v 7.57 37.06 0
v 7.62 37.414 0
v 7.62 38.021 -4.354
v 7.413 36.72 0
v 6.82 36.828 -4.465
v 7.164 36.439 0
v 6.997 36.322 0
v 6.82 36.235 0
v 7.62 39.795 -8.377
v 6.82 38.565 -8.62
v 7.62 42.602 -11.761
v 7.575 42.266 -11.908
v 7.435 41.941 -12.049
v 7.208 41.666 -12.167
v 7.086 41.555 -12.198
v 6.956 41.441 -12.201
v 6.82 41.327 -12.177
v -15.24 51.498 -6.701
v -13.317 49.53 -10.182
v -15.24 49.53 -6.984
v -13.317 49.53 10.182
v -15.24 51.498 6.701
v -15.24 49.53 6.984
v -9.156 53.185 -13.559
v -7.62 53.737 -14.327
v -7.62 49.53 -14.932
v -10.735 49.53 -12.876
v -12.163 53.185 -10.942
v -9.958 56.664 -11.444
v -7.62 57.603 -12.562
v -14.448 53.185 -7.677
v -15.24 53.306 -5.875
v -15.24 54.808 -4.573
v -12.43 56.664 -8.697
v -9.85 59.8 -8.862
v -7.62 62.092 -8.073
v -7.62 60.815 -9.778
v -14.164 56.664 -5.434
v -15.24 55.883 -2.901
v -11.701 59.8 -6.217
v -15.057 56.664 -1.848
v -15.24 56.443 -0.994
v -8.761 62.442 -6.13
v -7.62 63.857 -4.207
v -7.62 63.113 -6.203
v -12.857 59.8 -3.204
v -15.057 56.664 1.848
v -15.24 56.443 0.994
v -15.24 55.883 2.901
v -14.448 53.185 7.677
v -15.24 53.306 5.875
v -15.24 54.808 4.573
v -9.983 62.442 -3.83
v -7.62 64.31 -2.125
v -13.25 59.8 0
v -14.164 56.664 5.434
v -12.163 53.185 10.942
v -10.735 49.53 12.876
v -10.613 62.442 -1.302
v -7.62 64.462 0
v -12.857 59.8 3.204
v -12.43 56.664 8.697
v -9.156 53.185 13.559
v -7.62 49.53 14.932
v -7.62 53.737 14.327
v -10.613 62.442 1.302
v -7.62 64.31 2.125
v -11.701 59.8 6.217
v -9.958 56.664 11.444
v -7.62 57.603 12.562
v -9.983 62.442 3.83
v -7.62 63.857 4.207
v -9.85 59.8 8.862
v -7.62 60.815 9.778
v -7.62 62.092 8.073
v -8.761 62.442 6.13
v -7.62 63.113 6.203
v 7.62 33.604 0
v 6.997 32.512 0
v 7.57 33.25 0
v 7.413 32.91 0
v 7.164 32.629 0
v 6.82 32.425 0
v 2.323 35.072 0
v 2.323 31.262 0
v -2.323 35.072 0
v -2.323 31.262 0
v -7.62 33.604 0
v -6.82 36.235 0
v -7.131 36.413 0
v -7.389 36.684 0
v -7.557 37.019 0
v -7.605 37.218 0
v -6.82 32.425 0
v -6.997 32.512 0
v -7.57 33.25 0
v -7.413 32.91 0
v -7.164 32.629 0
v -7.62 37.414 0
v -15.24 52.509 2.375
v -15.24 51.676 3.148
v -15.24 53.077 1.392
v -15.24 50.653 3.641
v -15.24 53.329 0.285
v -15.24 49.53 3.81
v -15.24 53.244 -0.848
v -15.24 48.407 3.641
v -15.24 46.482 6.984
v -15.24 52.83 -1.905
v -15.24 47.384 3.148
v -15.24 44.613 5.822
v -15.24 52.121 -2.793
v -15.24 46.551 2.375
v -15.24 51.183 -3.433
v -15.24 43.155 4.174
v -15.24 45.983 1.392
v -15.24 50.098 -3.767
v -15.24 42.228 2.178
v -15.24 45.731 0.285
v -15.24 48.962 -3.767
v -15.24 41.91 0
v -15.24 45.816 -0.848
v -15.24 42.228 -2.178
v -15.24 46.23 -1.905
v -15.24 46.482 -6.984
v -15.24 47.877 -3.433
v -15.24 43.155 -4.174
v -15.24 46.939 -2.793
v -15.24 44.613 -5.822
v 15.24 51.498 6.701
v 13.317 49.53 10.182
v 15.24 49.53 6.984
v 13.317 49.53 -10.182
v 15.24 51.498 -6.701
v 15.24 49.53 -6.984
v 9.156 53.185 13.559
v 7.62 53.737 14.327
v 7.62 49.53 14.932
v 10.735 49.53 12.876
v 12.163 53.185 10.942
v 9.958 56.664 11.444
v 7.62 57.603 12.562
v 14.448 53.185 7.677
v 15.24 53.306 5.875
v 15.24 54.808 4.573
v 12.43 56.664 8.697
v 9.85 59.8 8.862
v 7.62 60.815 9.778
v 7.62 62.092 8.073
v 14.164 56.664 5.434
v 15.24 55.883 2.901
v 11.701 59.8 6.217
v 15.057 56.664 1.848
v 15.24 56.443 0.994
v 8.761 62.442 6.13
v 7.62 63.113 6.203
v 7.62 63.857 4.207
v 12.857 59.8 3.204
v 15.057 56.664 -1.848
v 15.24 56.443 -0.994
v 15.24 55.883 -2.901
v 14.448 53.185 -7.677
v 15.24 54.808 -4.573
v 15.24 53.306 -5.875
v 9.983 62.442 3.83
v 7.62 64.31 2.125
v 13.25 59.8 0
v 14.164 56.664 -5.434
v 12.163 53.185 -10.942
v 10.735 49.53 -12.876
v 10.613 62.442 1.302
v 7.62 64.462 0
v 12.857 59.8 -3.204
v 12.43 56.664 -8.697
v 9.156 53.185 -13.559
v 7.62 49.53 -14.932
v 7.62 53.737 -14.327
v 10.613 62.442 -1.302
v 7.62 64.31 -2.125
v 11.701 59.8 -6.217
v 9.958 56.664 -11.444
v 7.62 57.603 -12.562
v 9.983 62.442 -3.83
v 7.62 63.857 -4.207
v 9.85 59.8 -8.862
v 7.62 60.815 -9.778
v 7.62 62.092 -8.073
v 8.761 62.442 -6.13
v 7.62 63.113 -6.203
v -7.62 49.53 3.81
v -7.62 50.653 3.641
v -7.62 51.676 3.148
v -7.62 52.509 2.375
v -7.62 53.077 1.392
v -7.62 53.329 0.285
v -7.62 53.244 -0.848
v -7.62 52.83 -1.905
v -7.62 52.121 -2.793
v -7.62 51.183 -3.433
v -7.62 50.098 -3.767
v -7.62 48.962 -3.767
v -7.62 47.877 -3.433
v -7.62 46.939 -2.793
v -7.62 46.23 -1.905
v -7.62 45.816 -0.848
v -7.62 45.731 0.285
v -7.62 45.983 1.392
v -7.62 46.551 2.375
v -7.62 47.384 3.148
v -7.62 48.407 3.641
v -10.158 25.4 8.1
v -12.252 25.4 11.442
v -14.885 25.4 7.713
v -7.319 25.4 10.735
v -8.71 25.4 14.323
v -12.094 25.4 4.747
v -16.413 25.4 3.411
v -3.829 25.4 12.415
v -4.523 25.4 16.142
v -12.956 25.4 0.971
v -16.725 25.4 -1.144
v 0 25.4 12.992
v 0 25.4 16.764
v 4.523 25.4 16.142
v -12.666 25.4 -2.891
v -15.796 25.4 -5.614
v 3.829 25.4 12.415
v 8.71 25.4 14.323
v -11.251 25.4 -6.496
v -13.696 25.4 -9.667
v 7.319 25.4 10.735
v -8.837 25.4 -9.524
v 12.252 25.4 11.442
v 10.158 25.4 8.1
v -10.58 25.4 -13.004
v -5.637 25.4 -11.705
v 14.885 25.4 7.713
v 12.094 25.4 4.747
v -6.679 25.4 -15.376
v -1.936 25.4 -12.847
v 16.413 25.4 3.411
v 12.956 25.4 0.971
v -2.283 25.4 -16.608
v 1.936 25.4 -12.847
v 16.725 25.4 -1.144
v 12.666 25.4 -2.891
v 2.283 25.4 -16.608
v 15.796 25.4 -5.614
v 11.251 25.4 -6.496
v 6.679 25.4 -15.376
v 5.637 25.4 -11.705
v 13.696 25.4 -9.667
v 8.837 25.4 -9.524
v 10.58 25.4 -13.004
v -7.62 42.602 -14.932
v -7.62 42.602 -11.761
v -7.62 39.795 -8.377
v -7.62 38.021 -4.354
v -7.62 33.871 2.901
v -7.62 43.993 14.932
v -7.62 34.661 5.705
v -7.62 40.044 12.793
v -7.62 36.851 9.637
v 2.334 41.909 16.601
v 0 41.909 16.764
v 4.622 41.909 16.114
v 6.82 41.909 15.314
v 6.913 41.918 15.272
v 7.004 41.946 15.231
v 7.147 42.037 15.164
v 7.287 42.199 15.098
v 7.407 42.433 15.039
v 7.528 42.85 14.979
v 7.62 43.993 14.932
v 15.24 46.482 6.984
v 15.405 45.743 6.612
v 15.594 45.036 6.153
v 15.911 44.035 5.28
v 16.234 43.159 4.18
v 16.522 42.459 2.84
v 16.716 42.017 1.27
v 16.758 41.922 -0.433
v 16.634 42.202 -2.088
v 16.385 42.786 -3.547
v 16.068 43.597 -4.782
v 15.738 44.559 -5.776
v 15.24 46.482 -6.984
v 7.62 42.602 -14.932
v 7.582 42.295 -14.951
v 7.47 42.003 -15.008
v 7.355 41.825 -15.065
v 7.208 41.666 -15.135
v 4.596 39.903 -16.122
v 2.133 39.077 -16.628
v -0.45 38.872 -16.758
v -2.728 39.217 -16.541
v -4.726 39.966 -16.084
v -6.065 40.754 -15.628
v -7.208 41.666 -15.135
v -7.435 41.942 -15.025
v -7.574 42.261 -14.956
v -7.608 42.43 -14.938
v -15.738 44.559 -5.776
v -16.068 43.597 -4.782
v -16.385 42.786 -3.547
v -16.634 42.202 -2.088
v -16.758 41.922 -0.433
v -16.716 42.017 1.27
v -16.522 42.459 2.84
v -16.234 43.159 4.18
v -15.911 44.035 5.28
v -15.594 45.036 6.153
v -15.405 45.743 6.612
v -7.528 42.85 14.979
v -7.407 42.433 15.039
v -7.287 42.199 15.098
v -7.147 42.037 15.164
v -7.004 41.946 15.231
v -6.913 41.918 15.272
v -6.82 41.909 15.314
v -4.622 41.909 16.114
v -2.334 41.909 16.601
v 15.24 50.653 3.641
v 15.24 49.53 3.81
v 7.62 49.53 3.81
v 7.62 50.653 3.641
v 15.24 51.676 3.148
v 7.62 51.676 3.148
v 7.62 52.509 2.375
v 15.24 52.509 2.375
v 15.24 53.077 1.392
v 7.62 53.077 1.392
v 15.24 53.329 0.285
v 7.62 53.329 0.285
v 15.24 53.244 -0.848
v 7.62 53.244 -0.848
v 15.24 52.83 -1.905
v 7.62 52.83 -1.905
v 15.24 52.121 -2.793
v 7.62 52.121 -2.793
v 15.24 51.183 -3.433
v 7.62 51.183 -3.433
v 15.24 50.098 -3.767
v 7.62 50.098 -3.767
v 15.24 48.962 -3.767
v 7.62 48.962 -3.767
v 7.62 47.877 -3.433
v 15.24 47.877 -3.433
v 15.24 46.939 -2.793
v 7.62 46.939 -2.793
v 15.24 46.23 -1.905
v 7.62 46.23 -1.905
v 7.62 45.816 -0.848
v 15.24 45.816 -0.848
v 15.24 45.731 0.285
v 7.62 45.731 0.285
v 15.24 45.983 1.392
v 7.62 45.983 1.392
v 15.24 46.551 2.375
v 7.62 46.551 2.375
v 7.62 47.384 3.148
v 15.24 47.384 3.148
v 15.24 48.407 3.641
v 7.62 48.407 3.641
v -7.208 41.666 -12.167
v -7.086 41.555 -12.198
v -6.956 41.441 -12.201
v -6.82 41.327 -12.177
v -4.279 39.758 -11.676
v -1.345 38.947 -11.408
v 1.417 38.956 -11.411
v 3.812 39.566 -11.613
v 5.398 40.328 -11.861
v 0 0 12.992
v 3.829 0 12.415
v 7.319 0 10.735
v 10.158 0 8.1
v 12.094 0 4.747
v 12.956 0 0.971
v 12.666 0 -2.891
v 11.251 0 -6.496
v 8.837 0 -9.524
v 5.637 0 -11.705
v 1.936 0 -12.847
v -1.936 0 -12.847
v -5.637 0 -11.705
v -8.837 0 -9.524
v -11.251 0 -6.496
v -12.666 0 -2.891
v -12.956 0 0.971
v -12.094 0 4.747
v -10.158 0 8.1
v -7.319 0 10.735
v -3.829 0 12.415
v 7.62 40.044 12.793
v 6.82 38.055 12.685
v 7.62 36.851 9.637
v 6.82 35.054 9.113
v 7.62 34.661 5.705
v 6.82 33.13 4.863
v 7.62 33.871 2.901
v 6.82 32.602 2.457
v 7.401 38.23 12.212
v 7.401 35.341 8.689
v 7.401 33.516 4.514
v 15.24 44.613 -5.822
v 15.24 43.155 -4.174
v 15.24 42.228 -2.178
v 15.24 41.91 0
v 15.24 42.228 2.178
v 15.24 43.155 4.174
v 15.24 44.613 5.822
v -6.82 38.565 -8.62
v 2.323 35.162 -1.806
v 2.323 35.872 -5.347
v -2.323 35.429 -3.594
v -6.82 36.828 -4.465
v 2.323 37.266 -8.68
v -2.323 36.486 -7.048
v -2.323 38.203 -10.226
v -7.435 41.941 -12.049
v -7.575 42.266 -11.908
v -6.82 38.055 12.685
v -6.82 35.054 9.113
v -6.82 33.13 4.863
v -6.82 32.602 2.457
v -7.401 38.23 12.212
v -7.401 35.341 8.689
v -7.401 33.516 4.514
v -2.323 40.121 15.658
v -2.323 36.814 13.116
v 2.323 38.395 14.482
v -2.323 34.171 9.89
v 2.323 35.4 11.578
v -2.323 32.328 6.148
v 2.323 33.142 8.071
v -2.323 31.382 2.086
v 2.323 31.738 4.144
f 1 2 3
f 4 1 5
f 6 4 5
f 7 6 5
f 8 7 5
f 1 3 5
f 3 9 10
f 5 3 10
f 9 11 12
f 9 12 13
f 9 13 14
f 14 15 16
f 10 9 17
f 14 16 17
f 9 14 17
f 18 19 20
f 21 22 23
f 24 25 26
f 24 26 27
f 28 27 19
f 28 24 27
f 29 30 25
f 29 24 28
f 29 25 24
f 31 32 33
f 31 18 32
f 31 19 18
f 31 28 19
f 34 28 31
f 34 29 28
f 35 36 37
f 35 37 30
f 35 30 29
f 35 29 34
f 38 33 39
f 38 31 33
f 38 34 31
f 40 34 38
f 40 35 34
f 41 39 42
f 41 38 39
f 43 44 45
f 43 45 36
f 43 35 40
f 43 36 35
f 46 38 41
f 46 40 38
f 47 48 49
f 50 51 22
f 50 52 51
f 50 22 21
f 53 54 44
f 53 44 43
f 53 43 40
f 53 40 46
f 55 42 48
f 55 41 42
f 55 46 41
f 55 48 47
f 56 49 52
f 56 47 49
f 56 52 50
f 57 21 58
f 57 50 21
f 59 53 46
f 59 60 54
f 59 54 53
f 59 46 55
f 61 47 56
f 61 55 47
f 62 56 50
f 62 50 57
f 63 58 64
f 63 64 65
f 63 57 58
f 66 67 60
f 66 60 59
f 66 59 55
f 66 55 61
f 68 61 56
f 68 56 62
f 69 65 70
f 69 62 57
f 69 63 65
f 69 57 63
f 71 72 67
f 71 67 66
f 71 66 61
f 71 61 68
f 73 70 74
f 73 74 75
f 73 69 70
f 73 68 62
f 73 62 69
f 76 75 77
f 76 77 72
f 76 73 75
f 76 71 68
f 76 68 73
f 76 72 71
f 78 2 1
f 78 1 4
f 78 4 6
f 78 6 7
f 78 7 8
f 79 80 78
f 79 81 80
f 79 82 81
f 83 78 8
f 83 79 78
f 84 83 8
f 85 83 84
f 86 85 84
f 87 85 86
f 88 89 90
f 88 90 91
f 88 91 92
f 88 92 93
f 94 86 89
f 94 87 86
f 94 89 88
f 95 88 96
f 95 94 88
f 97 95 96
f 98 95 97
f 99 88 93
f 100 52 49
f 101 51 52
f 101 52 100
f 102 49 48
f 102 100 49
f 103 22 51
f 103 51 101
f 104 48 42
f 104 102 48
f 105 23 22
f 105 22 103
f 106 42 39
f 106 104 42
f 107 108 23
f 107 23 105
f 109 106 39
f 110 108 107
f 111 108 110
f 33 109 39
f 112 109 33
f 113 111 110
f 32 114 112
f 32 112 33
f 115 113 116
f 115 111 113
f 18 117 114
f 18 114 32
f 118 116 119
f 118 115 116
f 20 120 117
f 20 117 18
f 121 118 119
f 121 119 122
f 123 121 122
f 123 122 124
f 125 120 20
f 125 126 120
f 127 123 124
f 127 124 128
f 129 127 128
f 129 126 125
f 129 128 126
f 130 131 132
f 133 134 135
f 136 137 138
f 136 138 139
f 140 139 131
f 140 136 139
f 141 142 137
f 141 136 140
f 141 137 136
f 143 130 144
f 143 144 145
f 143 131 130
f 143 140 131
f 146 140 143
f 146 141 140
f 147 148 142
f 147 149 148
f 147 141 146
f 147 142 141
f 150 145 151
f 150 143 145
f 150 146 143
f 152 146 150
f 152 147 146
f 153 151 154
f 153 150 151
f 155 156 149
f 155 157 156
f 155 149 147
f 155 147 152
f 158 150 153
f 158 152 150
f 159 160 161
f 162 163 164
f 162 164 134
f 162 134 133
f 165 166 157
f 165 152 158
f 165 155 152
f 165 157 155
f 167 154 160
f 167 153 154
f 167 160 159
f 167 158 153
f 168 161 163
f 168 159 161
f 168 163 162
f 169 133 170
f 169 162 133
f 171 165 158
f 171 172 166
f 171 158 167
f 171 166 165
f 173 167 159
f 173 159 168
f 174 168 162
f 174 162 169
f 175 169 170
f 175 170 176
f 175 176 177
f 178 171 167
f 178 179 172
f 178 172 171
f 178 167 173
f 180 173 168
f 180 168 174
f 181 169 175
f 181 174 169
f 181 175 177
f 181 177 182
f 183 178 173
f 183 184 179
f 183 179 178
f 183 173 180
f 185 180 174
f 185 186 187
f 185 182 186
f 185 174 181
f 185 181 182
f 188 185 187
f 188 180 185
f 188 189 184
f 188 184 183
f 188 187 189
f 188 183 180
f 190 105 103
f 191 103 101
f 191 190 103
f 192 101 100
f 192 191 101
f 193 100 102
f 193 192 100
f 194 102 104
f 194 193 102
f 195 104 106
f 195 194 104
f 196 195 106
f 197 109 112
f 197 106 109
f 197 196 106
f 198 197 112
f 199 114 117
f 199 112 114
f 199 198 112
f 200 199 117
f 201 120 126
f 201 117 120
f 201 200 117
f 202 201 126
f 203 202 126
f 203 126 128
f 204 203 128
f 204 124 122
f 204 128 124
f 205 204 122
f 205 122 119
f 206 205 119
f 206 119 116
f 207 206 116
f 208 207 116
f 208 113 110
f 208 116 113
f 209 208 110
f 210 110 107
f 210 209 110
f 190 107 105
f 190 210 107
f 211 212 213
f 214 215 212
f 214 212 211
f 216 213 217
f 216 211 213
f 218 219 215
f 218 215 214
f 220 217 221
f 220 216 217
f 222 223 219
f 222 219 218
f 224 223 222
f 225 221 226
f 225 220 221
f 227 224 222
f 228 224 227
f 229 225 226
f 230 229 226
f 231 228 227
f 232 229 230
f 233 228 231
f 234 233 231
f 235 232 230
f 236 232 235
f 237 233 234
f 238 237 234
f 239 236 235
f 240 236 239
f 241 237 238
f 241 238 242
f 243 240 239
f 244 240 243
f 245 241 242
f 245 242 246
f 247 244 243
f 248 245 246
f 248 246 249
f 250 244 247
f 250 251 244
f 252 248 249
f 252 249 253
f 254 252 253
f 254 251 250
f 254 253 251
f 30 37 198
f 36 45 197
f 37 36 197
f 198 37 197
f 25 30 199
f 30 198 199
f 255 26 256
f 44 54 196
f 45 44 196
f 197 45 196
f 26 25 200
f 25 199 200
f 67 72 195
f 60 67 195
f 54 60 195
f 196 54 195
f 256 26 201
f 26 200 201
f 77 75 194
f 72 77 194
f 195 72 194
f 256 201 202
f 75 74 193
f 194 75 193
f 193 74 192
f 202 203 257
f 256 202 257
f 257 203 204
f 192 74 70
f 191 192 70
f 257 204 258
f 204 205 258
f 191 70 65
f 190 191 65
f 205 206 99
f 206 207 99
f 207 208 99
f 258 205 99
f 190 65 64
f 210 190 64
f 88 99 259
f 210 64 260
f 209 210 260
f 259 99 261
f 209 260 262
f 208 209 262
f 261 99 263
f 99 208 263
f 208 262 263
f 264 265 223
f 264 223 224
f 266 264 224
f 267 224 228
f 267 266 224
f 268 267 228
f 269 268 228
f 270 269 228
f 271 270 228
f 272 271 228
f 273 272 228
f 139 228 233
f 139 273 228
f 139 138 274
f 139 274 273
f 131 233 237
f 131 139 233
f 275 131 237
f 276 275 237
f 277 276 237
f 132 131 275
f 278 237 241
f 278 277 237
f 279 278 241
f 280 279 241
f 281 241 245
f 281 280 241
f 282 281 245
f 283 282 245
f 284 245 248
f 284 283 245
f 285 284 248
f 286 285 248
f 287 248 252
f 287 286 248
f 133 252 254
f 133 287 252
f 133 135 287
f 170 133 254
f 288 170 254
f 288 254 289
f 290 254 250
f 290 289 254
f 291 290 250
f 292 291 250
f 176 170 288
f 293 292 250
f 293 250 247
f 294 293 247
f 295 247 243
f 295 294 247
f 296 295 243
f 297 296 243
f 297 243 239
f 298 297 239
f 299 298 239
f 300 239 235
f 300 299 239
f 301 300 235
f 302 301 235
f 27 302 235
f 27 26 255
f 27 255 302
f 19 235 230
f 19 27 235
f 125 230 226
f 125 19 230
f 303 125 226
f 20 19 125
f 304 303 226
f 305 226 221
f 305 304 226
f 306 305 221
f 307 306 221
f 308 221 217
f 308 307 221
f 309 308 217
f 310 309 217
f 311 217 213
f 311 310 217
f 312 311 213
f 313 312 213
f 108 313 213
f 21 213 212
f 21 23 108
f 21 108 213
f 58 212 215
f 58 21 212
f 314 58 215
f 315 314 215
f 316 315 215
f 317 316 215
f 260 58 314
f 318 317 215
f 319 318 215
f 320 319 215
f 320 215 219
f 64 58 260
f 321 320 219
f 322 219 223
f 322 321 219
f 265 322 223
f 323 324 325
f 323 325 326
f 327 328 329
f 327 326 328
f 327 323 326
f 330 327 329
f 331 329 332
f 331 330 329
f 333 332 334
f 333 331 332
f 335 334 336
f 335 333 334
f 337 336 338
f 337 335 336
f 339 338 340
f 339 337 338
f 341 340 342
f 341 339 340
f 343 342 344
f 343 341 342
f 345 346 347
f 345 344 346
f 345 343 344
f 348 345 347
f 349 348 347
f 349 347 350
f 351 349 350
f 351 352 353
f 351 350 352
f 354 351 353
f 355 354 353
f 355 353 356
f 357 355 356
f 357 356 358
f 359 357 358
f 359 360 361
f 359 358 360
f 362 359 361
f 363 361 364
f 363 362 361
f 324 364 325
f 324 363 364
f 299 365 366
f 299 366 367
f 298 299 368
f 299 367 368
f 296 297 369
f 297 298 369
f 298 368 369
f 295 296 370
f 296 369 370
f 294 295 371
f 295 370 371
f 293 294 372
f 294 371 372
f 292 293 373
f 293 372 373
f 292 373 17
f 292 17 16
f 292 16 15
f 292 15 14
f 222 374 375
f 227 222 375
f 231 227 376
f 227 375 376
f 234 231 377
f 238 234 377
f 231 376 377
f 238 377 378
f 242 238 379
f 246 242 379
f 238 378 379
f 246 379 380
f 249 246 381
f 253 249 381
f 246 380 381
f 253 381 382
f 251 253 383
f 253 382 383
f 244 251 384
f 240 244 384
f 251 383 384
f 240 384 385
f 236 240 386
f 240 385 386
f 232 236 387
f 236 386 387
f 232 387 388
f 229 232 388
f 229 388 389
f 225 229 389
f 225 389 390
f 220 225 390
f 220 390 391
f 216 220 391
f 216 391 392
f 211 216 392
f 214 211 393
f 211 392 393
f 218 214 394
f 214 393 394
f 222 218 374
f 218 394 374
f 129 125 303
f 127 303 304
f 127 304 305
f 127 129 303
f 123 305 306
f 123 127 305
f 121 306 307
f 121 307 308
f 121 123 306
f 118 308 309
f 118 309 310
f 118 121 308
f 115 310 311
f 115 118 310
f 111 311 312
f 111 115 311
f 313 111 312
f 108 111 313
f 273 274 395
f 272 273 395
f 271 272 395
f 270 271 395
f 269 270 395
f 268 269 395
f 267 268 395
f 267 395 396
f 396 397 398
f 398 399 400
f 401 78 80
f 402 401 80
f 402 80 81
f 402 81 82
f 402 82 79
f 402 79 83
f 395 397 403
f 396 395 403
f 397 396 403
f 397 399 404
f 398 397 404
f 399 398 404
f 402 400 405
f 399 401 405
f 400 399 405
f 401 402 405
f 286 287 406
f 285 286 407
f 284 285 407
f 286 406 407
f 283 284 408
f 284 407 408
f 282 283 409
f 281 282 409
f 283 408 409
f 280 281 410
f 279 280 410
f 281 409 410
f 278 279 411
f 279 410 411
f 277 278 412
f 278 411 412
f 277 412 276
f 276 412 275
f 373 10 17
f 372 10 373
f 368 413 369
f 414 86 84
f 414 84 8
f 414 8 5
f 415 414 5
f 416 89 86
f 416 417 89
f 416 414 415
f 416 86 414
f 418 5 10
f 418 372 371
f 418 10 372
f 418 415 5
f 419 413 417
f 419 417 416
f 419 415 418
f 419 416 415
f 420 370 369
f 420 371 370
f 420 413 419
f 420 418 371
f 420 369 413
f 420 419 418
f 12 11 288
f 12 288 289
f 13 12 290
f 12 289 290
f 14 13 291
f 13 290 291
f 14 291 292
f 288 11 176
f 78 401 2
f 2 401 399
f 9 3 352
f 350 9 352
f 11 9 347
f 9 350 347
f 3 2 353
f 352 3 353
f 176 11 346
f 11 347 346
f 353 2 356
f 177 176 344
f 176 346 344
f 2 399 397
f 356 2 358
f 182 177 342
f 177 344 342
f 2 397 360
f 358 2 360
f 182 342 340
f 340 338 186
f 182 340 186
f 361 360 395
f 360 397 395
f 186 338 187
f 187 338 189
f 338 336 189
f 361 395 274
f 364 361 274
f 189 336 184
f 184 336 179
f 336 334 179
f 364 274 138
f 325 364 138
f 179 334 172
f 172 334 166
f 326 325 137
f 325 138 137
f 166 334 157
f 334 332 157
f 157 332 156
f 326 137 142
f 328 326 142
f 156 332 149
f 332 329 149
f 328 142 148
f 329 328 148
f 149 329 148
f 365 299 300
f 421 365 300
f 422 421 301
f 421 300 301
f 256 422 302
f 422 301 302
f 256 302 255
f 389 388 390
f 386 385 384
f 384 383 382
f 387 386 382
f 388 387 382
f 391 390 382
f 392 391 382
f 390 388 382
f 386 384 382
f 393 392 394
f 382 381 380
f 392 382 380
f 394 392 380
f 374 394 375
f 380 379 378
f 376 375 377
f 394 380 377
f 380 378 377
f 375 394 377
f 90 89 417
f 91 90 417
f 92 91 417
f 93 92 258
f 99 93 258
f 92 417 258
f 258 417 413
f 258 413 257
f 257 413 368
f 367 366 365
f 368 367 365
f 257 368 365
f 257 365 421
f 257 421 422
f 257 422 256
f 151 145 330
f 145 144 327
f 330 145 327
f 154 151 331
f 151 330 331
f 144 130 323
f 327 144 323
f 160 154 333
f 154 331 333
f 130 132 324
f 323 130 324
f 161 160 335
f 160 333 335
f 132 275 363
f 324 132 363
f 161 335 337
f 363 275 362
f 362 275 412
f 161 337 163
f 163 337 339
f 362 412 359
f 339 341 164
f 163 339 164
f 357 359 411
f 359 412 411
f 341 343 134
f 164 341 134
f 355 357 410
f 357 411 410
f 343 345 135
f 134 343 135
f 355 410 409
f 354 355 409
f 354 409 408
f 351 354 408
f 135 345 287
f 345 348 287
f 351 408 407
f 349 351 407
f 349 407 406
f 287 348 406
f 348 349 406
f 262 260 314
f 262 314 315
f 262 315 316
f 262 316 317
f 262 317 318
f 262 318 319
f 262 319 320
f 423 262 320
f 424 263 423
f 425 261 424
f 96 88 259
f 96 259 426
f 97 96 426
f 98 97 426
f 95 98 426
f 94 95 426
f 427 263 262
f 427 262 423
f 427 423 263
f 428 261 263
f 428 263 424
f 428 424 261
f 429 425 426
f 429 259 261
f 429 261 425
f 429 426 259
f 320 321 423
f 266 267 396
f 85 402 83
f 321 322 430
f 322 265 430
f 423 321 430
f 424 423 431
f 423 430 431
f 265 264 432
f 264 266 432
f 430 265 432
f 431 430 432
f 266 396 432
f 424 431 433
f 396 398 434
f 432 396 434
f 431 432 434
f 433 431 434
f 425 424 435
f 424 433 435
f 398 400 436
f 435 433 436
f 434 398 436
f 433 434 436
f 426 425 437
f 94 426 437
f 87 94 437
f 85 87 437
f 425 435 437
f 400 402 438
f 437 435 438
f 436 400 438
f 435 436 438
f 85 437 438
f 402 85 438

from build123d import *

# Parameters (mm, degrees)
SKETCH1_R                     = 12.9921
BOSS_EXTRUDE1_DEPTH           = 25.4
CUT_EXTRUDE1_DEPTH            = 102.12582981
CUT_EXTRUDE1_DEPTH_BACK       = 102.12582981
SKETCH3_R                     = 3.81
CUT_REVOLVE10_ANGLE           = 90
CUT_REVOLVE10_OTHER_WAY_ANGLE = 180
CUT_EXTRUDE4_DEPTH            = 32.004
FILLET1_R                     = 1.27
SKETCH15_R                    = 7.62
CUT_EXTRUDE5_DEPTH            = 10.16


with BuildPart() as part:
    # Sketch1 → Boss-Extrude1 (new body)
    with BuildSketch(Plane(origin=(0, 0, 0), x_dir=(1, 0, 0), z_dir=(0, 1, 0))):
        Circle(SKETCH1_R)
    extrude(amount=BOSS_EXTRUDE1_DEPTH)

    # Sketch2 → Revolve1 (revolve)
    with BuildSketch(Plane(origin=(0, 0, 0), x_dir=(0, 0, -1), z_dir=(1, 0, 0))):
        with BuildLine():
            Line((-16.764, 25.4), (-16.764, 49.53))
            ThreePointArc((-16.764, 49.53), (-11.85393808, 61.38393808), (0, 66.294))
            Line((0, 66.294), (0, 25.4))
            Line((0, 25.4), (-16.764, 25.4))
        make_face()
    revolve(axis=Axis((0, 25.4, 0), (0, 1, 0)))

    # Sketch3 → Cut-Extrude1 (cut, two sides: drawn at the far end of the back side and taken through both)
    with BuildSketch(Plane(origin=(0, 98.307528007, 0), x_dir=(0, 0, -1), z_dir=(-1, 0, 0)).offset(-CUT_EXTRUDE1_DEPTH_BACK)):
        with Locations((0, 48.777528007)):
            Circle(SKETCH3_R)
    extrude(amount=CUT_EXTRUDE1_DEPTH + CUT_EXTRUDE1_DEPTH_BACK, mode=Mode.SUBTRACT)

    # Sketch11 → Cut-Revolve10 (revolve, cut)
    with BuildSketch(Plane.XY):
        with BuildLine():
            Line((-7.62, 49.53), (-7.62, 66.294481054))
            ThreePointArc((-7.62, 66.294481054), (0, 67.945), (7.62, 66.294481054))
            Line((7.62, 66.294481054), (7.62, 49.53))
            Line((7.62, 49.53), (-7.62, 49.53))
        make_face()
    revolve(axis=Axis((16.764, 49.53, 0), (-1, 0, 0)), revolution_arc=CUT_REVOLVE10_ANGLE, mode=Mode.SUBTRACT)

    # Sketch11 → Cut-Revolve10 other way (revolve, cut)
    with BuildSketch(Plane.XY):
        with BuildLine():
            Line((-7.62, 49.53), (-7.62, 66.294481054))
            ThreePointArc((-7.62, 66.294481054), (0, 67.945), (7.62, 66.294481054))
            Line((7.62, 66.294481054), (7.62, 49.53))
            Line((7.62, 49.53), (-7.62, 49.53))
        make_face()
    revolve(axis=Axis((16.764, 49.53, 0), (1, 0, 0)), revolution_arc=CUT_REVOLVE10_OTHER_WAY_ANGLE, mode=Mode.SUBTRACT)

    # Sketch13 → Cut-Revolve11 (revolve, cut)
    with BuildSketch(Plane.XY):
        with BuildLine():
            Line((-7.62, 53.34), (7.62, 53.34))
            Line((7.62, 53.34), (7.62, 70.104481054))
            ThreePointArc((7.62, 70.104481054), (0, 71.755), (-7.62, 70.104481054))
            Line((-7.62, 70.104481054), (-7.62, 53.34))
        make_face()
    revolve(axis=Axis((-7.62, 53.34, 0), (1, 0, 0)), mode=Mode.SUBTRACT)

    # Sketch14 → Cut-Extrude4 (cut)
    with BuildSketch(Plane.XY):
        with BuildLine():
            Line((-7.62, 49.53), (-7.62, 42.063955264))
            ThreePointArc((-7.62, 42.063955264), (0, 38.862), (7.62, 42.063955264))
            Line((7.62, 42.063955264), (7.62, 49.53))
            Line((7.62, 49.53), (-7.62, 49.53))
        make_face()
    extrude(amount=-CUT_EXTRUDE4_DEPTH, mode=Mode.SUBTRACT)

    # Fillet1
    fillet1_edges = [part.edges().sort_by_distance(p)[0] for p in [
        (-7.62, 35.232956393, 8.754562759),
        (-7.62, 38.008906377, -6.782727573),
        (-7.62, 42.063955264, -13.66883927),
        (7.62, 42.063955264, -13.66883927),
        (7.62, 38.008906377, -6.782727573),
        (7.62, 35.232956393, 8.754562759),
    ]]
    fillet(fillet1_edges, radius=FILLET1_R)

    # Sketch15 → Cut-Extrude5 (cut)
    with BuildSketch(Plane(origin=(-15.24, 0, 0), x_dir=(0, 0, -1), z_dir=(-1, 0, 0))):
        with Locations((0, -49.53)):
            Circle(SKETCH15_R)
    cut_extrude5 = extrude(amount=CUT_EXTRUDE5_DEPTH, mode=Mode.SUBTRACT)

    # Mirror1: Cut-Extrude5 across plane
    add(cut_extrude5.mirror(Plane.ZY), mode=Mode.SUBTRACT)


solid = part.part
